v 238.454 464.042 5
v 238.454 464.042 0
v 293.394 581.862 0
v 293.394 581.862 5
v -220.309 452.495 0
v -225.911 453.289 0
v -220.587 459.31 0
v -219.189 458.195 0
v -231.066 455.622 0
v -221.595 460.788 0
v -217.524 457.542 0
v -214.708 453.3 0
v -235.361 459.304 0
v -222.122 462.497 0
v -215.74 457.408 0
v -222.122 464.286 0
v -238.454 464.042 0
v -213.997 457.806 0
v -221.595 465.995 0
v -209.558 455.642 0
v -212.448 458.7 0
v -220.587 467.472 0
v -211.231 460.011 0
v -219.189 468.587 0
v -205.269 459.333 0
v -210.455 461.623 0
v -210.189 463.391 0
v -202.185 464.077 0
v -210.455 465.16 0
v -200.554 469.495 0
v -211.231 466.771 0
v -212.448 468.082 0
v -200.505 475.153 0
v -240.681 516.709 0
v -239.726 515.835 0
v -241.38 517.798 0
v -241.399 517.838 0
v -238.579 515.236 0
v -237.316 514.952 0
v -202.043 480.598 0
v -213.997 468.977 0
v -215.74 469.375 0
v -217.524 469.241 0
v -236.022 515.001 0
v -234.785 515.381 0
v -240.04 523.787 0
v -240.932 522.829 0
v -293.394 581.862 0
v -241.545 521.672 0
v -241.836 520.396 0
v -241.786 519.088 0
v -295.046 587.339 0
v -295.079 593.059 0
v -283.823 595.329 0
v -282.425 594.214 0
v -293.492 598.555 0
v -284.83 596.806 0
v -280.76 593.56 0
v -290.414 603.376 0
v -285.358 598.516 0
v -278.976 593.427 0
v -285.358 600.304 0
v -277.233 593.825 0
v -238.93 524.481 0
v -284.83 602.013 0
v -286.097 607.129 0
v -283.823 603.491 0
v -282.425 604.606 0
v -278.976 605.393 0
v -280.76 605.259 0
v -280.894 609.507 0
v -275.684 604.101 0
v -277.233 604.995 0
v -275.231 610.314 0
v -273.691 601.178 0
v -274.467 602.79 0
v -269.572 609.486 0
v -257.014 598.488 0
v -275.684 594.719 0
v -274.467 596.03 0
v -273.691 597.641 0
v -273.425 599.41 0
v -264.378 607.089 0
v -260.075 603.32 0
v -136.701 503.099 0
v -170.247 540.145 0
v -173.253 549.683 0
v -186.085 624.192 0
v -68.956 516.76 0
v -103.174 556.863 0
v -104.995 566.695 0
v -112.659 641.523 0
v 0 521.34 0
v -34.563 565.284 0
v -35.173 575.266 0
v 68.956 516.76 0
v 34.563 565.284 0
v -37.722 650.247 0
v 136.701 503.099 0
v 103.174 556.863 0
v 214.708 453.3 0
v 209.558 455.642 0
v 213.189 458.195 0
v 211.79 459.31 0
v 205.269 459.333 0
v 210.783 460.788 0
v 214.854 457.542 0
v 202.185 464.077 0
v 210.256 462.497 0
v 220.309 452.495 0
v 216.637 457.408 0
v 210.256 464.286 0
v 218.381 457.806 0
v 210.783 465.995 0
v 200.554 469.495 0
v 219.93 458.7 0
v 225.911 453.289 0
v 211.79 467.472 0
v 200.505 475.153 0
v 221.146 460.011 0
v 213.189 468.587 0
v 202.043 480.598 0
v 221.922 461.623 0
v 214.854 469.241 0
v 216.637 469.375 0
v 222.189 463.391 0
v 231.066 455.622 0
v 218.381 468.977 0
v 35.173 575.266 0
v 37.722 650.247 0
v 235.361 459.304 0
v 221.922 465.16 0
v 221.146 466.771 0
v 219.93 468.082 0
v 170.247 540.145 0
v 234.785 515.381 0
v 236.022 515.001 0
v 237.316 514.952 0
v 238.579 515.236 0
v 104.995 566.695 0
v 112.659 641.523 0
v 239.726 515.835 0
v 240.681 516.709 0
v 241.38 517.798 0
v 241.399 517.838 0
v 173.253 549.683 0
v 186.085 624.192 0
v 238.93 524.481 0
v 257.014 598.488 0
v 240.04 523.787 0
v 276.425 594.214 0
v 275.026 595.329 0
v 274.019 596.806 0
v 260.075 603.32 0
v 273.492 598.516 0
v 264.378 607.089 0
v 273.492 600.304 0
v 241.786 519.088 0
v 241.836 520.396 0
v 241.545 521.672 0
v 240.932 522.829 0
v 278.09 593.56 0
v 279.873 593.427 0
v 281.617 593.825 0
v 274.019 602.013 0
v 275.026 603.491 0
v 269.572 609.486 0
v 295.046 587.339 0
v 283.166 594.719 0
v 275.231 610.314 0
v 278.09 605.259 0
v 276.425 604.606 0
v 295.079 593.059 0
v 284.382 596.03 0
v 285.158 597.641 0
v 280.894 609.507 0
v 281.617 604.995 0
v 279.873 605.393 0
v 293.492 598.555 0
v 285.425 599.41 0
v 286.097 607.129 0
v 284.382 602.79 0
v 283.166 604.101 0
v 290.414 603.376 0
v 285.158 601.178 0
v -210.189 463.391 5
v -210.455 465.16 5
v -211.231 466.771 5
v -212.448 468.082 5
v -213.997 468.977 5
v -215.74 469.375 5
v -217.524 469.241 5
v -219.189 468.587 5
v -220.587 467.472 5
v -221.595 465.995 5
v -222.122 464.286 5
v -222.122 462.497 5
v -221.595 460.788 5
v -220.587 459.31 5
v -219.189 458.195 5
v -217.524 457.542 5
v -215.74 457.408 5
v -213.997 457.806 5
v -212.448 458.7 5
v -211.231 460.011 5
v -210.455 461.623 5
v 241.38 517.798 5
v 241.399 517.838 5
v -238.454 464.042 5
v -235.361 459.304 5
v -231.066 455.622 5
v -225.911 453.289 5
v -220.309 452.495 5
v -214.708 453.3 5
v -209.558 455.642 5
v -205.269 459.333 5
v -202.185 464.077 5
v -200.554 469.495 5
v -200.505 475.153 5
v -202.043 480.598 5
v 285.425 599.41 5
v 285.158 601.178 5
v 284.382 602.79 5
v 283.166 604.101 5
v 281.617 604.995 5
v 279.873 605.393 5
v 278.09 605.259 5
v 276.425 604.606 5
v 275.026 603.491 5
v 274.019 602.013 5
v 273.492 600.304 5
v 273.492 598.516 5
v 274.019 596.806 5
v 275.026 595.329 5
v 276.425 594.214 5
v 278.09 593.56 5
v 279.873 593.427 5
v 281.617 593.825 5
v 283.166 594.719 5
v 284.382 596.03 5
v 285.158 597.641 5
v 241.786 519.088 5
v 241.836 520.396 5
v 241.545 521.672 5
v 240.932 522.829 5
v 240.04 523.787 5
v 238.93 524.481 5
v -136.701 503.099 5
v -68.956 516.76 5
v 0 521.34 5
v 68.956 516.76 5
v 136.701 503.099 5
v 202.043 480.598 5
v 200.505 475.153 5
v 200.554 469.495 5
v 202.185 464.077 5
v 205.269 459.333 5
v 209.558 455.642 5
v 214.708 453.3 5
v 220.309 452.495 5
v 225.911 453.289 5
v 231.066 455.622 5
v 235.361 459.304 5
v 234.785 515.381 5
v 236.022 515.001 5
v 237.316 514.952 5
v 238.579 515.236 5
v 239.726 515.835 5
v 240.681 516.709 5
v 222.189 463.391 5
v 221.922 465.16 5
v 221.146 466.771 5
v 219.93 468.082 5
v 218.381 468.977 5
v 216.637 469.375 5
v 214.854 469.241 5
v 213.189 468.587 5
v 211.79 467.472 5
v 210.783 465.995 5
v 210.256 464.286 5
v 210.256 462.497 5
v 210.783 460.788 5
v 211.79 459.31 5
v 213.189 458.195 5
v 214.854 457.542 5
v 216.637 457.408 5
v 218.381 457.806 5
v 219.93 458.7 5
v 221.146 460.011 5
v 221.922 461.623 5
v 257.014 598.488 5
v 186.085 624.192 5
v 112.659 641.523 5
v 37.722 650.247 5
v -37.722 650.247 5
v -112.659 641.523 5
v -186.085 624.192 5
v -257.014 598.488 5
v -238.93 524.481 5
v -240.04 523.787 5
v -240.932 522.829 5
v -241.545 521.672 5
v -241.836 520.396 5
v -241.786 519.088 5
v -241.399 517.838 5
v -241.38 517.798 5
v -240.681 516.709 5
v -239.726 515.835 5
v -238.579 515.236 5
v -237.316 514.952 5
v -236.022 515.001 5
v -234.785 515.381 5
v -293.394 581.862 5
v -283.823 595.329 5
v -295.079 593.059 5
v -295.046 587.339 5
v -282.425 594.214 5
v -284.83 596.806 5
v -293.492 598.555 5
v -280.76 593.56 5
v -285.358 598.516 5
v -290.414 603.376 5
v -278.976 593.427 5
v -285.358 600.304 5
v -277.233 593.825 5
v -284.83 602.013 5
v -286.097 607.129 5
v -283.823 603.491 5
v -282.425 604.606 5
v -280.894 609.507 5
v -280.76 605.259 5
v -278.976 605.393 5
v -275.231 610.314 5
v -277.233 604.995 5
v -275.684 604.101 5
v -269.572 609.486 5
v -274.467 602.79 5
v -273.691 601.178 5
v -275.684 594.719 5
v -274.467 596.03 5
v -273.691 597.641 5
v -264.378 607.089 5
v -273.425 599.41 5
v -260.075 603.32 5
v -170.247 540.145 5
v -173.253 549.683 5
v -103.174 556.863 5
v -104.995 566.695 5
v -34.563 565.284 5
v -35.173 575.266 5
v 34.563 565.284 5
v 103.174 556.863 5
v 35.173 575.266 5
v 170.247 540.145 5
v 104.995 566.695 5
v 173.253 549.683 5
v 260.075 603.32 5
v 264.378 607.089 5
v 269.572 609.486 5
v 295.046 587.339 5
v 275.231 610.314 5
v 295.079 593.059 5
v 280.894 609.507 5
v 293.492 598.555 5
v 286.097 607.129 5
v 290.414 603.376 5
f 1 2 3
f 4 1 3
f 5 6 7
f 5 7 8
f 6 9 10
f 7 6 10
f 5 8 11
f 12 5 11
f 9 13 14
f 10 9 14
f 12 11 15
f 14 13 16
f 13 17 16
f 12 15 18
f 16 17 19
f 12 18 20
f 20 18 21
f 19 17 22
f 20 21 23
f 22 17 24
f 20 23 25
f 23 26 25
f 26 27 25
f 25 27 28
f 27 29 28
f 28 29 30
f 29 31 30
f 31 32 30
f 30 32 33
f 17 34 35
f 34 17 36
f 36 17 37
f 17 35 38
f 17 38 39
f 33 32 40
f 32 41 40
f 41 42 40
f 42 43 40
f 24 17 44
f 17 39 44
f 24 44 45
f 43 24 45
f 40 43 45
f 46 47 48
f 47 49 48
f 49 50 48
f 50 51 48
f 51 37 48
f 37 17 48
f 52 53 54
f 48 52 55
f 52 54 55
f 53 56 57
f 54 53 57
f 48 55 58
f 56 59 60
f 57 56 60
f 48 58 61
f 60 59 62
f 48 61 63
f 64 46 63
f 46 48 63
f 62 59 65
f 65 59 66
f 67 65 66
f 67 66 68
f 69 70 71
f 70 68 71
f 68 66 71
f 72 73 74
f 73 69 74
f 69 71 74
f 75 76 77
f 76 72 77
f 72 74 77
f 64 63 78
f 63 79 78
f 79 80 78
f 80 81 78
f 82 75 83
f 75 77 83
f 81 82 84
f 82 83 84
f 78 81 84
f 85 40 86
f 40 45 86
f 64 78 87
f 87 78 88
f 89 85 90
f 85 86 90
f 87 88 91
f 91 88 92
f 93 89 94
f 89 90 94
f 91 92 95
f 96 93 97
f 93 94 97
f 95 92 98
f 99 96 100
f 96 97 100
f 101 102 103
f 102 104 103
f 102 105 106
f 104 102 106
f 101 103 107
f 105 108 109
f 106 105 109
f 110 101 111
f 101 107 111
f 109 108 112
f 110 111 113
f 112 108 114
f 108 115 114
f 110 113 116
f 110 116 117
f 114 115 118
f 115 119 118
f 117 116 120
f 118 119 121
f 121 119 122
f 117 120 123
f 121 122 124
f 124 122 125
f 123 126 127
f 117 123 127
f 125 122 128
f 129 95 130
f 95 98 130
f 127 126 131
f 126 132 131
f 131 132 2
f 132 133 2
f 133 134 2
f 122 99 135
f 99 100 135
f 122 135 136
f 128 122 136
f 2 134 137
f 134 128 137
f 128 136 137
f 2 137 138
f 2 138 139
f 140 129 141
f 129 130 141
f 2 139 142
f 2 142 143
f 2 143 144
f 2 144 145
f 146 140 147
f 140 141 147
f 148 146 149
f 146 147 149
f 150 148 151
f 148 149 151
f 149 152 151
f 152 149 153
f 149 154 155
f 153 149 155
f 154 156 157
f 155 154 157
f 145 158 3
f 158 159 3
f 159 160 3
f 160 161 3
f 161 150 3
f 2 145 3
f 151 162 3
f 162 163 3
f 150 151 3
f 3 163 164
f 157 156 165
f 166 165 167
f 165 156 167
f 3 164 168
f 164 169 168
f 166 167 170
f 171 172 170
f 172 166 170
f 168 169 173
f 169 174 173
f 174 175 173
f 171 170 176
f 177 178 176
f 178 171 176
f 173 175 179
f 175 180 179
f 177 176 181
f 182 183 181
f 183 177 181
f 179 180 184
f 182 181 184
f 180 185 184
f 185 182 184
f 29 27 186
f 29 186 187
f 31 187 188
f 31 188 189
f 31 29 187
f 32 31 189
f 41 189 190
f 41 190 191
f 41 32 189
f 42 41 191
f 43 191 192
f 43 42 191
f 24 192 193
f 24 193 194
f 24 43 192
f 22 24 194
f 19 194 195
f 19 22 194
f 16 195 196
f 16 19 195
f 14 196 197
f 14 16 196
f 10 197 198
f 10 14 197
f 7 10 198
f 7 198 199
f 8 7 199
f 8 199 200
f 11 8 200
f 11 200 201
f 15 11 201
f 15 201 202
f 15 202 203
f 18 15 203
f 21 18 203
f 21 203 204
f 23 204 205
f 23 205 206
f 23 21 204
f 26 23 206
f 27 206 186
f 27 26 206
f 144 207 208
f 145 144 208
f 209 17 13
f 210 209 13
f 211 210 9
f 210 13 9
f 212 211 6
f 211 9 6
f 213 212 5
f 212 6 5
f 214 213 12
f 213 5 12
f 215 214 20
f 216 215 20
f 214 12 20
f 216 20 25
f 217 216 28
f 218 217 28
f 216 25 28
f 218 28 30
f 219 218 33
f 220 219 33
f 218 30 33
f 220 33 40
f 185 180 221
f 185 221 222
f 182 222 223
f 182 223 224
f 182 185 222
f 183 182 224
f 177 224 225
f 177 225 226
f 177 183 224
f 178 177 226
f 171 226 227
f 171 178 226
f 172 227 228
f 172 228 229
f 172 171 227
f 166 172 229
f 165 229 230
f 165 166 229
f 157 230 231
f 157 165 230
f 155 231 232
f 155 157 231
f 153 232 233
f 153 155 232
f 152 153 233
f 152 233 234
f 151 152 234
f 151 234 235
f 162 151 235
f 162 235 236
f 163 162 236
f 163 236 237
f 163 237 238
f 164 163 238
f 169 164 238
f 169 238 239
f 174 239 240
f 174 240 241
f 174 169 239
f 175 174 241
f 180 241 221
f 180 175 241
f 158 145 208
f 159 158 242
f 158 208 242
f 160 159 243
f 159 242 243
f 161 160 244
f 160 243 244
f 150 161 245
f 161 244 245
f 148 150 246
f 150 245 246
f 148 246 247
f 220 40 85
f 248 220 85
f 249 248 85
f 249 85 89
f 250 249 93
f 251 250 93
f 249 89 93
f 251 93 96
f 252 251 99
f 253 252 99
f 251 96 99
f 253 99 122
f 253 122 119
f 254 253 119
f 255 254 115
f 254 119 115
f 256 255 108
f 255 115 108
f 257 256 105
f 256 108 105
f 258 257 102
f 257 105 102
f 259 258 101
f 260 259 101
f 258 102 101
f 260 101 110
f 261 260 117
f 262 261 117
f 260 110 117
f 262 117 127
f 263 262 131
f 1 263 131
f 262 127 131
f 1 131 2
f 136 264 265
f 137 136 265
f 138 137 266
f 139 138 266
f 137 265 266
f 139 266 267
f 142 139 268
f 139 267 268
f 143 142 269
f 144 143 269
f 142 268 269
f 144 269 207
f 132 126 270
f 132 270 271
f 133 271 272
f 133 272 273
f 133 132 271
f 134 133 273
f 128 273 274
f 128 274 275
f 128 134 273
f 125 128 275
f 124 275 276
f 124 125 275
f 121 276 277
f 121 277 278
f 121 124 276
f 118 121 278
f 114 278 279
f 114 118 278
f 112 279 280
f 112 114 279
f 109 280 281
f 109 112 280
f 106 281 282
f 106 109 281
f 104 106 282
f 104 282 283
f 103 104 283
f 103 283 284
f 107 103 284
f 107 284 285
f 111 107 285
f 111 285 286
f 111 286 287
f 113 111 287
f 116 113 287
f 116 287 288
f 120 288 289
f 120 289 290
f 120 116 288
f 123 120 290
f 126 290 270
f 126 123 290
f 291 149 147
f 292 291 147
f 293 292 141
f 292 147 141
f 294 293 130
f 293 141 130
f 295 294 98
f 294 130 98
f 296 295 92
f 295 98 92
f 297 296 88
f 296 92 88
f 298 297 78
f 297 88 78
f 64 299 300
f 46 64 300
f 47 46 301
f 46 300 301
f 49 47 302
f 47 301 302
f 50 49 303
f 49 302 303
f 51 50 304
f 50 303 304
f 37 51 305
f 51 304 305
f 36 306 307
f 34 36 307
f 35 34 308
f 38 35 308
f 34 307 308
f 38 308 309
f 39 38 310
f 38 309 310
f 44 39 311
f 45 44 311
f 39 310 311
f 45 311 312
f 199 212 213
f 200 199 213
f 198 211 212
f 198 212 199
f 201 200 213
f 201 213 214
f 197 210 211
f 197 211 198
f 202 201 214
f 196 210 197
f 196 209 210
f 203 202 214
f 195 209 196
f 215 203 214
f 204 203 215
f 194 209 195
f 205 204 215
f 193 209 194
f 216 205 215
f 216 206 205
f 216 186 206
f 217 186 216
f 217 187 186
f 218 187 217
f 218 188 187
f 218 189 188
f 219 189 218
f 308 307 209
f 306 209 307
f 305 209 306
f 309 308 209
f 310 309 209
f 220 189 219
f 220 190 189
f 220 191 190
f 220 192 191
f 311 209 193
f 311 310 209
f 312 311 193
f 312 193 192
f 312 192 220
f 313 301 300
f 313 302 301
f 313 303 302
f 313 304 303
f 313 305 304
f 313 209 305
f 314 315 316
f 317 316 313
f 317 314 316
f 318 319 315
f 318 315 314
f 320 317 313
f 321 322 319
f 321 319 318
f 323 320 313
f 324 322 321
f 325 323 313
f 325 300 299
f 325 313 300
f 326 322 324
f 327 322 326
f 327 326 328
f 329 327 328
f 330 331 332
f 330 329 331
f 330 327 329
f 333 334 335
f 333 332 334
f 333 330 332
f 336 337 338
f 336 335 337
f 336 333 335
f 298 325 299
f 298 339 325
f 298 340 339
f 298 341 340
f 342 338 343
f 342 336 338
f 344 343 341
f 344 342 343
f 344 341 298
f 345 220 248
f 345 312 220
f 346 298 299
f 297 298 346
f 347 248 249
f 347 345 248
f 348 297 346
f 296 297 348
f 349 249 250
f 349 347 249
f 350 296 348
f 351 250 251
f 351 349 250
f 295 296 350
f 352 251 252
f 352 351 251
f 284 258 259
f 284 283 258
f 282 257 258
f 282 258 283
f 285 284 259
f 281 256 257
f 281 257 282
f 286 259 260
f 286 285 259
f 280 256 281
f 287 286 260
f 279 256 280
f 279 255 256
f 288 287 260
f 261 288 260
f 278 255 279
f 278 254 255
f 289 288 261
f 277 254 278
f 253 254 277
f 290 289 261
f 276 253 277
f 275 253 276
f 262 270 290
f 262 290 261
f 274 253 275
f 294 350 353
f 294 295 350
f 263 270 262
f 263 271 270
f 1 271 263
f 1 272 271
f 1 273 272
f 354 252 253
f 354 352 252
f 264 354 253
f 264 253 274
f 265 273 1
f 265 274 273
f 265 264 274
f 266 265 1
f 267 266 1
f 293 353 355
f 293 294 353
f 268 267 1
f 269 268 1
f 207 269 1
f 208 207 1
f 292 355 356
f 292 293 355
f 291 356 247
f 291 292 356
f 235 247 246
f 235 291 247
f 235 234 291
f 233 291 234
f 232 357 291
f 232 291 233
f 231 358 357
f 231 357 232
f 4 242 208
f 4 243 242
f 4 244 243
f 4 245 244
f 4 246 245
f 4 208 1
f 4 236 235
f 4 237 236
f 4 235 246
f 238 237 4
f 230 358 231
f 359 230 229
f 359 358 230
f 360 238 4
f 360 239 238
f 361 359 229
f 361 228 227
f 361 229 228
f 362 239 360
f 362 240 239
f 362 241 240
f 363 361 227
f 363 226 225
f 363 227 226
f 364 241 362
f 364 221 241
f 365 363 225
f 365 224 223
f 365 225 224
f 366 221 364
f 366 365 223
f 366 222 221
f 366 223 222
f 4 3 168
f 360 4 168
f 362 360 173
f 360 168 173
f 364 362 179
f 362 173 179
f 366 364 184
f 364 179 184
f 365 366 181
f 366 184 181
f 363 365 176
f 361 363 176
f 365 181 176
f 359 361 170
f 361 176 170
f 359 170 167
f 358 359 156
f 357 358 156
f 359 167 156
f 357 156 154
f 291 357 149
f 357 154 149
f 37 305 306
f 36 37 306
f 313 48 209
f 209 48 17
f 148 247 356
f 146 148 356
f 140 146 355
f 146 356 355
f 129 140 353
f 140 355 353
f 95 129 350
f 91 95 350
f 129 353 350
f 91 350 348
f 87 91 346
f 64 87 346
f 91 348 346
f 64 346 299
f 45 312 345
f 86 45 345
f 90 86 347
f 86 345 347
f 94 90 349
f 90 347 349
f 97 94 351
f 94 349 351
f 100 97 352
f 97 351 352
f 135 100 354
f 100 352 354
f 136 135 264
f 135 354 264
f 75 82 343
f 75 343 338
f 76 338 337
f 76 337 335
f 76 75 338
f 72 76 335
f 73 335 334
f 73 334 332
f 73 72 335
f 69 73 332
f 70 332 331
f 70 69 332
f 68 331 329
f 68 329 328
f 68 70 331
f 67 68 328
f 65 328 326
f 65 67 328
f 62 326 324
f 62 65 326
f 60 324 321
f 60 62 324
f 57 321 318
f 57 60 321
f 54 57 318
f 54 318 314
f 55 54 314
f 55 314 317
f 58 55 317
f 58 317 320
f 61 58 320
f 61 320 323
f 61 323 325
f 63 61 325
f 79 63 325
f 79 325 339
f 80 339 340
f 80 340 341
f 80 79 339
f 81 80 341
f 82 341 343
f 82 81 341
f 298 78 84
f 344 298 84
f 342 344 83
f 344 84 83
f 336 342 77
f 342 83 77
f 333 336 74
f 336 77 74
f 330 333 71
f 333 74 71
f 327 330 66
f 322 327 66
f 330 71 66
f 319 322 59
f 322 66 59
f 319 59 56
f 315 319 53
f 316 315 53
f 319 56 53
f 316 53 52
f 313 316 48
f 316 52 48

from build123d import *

# Parameters (mm, degrees)
DODANIE_WYCI_GNI_CIE1_DEPTH = 5
DODANIE_WYCI_GNI_CIE2_START = -5
SZKIC2_R                    = 6
DODANIE_WYCI_GNI_CIE2_DEPTH = 5
WYTNIJ_WYCI_GNI_CIE1_DEPTH  = 716.158788588


with BuildPart() as part:
    # Szkic1 → Dodanie-wyciągnięcie1 (new body)
    with BuildSketch(Plane.XY):
        with BuildLine():
            ThreePointArc((-241.458717663, 517.809891046), (0, 571.34), (241.458717663, 517.809891046))
            Line((241.458717663, 517.809891046), (275.268178602, 590.314514008))
            ThreePointArc((275.268178602, 590.314514008), (0, 651.34), (-275.268178602, 590.314514008))
            Line((-275.268178602, 590.314514008), (-241.458717663, 517.809891046))
        make_face()
        with BuildLine():
            ThreePointArc((-220.327804576, 472.494501694), (0, 521.34), (220.327804576, 472.494501694))
            Line((220.327804576, 472.494501694), (241.458717663, 517.809891046))
            ThreePointArc((241.458717663, 517.809891046), (0, 571.34), (-241.458717663, 517.809891046))
            Line((-241.458717663, 517.809891046), (-220.327804576, 472.494501694))
        make_face()
    extrude(amount=DODANIE_WYCI_GNI_CIE1_DEPTH)

    # Szkic2 → Dodanie-wyciągnięcie2 (add)
    with BuildSketch(Plane.XY.offset(5).offset(DODANIE_WYCI_GNI_CIE2_START)):
        with BuildLine():
            Line((-293.394334343, 581.862148774), (-238.453960317, 464.042136459))
            ThreePointArc((-238.453960317, 464.042136459), (-212.049678092, 454.288112103), (-202.042855969, 480.597627909))
            ThreePointArc((-202.042855969, 480.597627909), (0, 521.34), (202.042855969, 480.597627909))
            ThreePointArc((202.042855969, 480.597627909), (212.049678092, 454.288112103), (238.453960317, 464.042136459))
            Line((238.453960317, 464.042136459), (293.394334343, 581.862148774))
            ThreePointArc((293.394334343, 581.862148774), (283.581145562, 608.505021982), (257.014390413, 598.487592788))
            ThreePointArc((257.014390413, 598.487592788), (0, 651.34), (-257.014390413, 598.487592788))
            ThreePointArc((-257.014390413, 598.487592788), (-283.581145562, 608.505021982), (-293.394334343, 581.862148774))
        make_face()
        with Locations((-279.424662082, 599.409767995)):
            Circle(SZKIC2_R, mode=Mode.SUBTRACT)
        with Locations((-216.188741334, 463.391306898)):
            Circle(SZKIC2_R, mode=Mode.SUBTRACT)
        with Locations((216.188741334, 463.391306898)):
            Circle(SZKIC2_R, mode=Mode.SUBTRACT)
        with Locations((279.424662082, 599.409767995)):
            Circle(SZKIC2_R, mode=Mode.SUBTRACT)
    extrude(amount=DODANIE_WYCI_GNI_CIE2_DEPTH)

    # Szkic4 → Wytnij-wyciągnięcie1 (cut, through all)
    with BuildSketch(Plane.XY.offset(5)):
        with BuildLine():
            ThreePointArc((234.78479941, 515.380532778), (238.578545987, 515.23612037), (241.380121814, 517.798256378))
            Line((241.380121814, 517.798256378), (241.398609626, 517.837915637))
            ThreePointArc((241.398609626, 517.837915637), (241.544560472, 521.672077329), (238.930450422, 524.480729352))
            ThreePointArc((238.930450422, 524.480729352), (0, 576.34), (-238.930450422, 524.480729352))
            ThreePointArc((-238.930450422, 524.480729352), (-241.544560472, 521.672077329), (-241.398609626, 517.837915637))
            Line((-241.398609626, 517.837915637), (-241.380121814, 517.798256378))
            ThreePointArc((-241.380121814, 517.798256378), (-238.578545987, 515.23612037), (-234.78479941, 515.380532778))
            ThreePointArc((-234.78479941, 515.380532778), (0, 566.34), (234.78479941, 515.380532778))
        make_face()
    extrude(amount=-WYTNIJ_WYCI_GNI_CIE1_DEPTH, mode=Mode.SUBTRACT)


solid = part.part
